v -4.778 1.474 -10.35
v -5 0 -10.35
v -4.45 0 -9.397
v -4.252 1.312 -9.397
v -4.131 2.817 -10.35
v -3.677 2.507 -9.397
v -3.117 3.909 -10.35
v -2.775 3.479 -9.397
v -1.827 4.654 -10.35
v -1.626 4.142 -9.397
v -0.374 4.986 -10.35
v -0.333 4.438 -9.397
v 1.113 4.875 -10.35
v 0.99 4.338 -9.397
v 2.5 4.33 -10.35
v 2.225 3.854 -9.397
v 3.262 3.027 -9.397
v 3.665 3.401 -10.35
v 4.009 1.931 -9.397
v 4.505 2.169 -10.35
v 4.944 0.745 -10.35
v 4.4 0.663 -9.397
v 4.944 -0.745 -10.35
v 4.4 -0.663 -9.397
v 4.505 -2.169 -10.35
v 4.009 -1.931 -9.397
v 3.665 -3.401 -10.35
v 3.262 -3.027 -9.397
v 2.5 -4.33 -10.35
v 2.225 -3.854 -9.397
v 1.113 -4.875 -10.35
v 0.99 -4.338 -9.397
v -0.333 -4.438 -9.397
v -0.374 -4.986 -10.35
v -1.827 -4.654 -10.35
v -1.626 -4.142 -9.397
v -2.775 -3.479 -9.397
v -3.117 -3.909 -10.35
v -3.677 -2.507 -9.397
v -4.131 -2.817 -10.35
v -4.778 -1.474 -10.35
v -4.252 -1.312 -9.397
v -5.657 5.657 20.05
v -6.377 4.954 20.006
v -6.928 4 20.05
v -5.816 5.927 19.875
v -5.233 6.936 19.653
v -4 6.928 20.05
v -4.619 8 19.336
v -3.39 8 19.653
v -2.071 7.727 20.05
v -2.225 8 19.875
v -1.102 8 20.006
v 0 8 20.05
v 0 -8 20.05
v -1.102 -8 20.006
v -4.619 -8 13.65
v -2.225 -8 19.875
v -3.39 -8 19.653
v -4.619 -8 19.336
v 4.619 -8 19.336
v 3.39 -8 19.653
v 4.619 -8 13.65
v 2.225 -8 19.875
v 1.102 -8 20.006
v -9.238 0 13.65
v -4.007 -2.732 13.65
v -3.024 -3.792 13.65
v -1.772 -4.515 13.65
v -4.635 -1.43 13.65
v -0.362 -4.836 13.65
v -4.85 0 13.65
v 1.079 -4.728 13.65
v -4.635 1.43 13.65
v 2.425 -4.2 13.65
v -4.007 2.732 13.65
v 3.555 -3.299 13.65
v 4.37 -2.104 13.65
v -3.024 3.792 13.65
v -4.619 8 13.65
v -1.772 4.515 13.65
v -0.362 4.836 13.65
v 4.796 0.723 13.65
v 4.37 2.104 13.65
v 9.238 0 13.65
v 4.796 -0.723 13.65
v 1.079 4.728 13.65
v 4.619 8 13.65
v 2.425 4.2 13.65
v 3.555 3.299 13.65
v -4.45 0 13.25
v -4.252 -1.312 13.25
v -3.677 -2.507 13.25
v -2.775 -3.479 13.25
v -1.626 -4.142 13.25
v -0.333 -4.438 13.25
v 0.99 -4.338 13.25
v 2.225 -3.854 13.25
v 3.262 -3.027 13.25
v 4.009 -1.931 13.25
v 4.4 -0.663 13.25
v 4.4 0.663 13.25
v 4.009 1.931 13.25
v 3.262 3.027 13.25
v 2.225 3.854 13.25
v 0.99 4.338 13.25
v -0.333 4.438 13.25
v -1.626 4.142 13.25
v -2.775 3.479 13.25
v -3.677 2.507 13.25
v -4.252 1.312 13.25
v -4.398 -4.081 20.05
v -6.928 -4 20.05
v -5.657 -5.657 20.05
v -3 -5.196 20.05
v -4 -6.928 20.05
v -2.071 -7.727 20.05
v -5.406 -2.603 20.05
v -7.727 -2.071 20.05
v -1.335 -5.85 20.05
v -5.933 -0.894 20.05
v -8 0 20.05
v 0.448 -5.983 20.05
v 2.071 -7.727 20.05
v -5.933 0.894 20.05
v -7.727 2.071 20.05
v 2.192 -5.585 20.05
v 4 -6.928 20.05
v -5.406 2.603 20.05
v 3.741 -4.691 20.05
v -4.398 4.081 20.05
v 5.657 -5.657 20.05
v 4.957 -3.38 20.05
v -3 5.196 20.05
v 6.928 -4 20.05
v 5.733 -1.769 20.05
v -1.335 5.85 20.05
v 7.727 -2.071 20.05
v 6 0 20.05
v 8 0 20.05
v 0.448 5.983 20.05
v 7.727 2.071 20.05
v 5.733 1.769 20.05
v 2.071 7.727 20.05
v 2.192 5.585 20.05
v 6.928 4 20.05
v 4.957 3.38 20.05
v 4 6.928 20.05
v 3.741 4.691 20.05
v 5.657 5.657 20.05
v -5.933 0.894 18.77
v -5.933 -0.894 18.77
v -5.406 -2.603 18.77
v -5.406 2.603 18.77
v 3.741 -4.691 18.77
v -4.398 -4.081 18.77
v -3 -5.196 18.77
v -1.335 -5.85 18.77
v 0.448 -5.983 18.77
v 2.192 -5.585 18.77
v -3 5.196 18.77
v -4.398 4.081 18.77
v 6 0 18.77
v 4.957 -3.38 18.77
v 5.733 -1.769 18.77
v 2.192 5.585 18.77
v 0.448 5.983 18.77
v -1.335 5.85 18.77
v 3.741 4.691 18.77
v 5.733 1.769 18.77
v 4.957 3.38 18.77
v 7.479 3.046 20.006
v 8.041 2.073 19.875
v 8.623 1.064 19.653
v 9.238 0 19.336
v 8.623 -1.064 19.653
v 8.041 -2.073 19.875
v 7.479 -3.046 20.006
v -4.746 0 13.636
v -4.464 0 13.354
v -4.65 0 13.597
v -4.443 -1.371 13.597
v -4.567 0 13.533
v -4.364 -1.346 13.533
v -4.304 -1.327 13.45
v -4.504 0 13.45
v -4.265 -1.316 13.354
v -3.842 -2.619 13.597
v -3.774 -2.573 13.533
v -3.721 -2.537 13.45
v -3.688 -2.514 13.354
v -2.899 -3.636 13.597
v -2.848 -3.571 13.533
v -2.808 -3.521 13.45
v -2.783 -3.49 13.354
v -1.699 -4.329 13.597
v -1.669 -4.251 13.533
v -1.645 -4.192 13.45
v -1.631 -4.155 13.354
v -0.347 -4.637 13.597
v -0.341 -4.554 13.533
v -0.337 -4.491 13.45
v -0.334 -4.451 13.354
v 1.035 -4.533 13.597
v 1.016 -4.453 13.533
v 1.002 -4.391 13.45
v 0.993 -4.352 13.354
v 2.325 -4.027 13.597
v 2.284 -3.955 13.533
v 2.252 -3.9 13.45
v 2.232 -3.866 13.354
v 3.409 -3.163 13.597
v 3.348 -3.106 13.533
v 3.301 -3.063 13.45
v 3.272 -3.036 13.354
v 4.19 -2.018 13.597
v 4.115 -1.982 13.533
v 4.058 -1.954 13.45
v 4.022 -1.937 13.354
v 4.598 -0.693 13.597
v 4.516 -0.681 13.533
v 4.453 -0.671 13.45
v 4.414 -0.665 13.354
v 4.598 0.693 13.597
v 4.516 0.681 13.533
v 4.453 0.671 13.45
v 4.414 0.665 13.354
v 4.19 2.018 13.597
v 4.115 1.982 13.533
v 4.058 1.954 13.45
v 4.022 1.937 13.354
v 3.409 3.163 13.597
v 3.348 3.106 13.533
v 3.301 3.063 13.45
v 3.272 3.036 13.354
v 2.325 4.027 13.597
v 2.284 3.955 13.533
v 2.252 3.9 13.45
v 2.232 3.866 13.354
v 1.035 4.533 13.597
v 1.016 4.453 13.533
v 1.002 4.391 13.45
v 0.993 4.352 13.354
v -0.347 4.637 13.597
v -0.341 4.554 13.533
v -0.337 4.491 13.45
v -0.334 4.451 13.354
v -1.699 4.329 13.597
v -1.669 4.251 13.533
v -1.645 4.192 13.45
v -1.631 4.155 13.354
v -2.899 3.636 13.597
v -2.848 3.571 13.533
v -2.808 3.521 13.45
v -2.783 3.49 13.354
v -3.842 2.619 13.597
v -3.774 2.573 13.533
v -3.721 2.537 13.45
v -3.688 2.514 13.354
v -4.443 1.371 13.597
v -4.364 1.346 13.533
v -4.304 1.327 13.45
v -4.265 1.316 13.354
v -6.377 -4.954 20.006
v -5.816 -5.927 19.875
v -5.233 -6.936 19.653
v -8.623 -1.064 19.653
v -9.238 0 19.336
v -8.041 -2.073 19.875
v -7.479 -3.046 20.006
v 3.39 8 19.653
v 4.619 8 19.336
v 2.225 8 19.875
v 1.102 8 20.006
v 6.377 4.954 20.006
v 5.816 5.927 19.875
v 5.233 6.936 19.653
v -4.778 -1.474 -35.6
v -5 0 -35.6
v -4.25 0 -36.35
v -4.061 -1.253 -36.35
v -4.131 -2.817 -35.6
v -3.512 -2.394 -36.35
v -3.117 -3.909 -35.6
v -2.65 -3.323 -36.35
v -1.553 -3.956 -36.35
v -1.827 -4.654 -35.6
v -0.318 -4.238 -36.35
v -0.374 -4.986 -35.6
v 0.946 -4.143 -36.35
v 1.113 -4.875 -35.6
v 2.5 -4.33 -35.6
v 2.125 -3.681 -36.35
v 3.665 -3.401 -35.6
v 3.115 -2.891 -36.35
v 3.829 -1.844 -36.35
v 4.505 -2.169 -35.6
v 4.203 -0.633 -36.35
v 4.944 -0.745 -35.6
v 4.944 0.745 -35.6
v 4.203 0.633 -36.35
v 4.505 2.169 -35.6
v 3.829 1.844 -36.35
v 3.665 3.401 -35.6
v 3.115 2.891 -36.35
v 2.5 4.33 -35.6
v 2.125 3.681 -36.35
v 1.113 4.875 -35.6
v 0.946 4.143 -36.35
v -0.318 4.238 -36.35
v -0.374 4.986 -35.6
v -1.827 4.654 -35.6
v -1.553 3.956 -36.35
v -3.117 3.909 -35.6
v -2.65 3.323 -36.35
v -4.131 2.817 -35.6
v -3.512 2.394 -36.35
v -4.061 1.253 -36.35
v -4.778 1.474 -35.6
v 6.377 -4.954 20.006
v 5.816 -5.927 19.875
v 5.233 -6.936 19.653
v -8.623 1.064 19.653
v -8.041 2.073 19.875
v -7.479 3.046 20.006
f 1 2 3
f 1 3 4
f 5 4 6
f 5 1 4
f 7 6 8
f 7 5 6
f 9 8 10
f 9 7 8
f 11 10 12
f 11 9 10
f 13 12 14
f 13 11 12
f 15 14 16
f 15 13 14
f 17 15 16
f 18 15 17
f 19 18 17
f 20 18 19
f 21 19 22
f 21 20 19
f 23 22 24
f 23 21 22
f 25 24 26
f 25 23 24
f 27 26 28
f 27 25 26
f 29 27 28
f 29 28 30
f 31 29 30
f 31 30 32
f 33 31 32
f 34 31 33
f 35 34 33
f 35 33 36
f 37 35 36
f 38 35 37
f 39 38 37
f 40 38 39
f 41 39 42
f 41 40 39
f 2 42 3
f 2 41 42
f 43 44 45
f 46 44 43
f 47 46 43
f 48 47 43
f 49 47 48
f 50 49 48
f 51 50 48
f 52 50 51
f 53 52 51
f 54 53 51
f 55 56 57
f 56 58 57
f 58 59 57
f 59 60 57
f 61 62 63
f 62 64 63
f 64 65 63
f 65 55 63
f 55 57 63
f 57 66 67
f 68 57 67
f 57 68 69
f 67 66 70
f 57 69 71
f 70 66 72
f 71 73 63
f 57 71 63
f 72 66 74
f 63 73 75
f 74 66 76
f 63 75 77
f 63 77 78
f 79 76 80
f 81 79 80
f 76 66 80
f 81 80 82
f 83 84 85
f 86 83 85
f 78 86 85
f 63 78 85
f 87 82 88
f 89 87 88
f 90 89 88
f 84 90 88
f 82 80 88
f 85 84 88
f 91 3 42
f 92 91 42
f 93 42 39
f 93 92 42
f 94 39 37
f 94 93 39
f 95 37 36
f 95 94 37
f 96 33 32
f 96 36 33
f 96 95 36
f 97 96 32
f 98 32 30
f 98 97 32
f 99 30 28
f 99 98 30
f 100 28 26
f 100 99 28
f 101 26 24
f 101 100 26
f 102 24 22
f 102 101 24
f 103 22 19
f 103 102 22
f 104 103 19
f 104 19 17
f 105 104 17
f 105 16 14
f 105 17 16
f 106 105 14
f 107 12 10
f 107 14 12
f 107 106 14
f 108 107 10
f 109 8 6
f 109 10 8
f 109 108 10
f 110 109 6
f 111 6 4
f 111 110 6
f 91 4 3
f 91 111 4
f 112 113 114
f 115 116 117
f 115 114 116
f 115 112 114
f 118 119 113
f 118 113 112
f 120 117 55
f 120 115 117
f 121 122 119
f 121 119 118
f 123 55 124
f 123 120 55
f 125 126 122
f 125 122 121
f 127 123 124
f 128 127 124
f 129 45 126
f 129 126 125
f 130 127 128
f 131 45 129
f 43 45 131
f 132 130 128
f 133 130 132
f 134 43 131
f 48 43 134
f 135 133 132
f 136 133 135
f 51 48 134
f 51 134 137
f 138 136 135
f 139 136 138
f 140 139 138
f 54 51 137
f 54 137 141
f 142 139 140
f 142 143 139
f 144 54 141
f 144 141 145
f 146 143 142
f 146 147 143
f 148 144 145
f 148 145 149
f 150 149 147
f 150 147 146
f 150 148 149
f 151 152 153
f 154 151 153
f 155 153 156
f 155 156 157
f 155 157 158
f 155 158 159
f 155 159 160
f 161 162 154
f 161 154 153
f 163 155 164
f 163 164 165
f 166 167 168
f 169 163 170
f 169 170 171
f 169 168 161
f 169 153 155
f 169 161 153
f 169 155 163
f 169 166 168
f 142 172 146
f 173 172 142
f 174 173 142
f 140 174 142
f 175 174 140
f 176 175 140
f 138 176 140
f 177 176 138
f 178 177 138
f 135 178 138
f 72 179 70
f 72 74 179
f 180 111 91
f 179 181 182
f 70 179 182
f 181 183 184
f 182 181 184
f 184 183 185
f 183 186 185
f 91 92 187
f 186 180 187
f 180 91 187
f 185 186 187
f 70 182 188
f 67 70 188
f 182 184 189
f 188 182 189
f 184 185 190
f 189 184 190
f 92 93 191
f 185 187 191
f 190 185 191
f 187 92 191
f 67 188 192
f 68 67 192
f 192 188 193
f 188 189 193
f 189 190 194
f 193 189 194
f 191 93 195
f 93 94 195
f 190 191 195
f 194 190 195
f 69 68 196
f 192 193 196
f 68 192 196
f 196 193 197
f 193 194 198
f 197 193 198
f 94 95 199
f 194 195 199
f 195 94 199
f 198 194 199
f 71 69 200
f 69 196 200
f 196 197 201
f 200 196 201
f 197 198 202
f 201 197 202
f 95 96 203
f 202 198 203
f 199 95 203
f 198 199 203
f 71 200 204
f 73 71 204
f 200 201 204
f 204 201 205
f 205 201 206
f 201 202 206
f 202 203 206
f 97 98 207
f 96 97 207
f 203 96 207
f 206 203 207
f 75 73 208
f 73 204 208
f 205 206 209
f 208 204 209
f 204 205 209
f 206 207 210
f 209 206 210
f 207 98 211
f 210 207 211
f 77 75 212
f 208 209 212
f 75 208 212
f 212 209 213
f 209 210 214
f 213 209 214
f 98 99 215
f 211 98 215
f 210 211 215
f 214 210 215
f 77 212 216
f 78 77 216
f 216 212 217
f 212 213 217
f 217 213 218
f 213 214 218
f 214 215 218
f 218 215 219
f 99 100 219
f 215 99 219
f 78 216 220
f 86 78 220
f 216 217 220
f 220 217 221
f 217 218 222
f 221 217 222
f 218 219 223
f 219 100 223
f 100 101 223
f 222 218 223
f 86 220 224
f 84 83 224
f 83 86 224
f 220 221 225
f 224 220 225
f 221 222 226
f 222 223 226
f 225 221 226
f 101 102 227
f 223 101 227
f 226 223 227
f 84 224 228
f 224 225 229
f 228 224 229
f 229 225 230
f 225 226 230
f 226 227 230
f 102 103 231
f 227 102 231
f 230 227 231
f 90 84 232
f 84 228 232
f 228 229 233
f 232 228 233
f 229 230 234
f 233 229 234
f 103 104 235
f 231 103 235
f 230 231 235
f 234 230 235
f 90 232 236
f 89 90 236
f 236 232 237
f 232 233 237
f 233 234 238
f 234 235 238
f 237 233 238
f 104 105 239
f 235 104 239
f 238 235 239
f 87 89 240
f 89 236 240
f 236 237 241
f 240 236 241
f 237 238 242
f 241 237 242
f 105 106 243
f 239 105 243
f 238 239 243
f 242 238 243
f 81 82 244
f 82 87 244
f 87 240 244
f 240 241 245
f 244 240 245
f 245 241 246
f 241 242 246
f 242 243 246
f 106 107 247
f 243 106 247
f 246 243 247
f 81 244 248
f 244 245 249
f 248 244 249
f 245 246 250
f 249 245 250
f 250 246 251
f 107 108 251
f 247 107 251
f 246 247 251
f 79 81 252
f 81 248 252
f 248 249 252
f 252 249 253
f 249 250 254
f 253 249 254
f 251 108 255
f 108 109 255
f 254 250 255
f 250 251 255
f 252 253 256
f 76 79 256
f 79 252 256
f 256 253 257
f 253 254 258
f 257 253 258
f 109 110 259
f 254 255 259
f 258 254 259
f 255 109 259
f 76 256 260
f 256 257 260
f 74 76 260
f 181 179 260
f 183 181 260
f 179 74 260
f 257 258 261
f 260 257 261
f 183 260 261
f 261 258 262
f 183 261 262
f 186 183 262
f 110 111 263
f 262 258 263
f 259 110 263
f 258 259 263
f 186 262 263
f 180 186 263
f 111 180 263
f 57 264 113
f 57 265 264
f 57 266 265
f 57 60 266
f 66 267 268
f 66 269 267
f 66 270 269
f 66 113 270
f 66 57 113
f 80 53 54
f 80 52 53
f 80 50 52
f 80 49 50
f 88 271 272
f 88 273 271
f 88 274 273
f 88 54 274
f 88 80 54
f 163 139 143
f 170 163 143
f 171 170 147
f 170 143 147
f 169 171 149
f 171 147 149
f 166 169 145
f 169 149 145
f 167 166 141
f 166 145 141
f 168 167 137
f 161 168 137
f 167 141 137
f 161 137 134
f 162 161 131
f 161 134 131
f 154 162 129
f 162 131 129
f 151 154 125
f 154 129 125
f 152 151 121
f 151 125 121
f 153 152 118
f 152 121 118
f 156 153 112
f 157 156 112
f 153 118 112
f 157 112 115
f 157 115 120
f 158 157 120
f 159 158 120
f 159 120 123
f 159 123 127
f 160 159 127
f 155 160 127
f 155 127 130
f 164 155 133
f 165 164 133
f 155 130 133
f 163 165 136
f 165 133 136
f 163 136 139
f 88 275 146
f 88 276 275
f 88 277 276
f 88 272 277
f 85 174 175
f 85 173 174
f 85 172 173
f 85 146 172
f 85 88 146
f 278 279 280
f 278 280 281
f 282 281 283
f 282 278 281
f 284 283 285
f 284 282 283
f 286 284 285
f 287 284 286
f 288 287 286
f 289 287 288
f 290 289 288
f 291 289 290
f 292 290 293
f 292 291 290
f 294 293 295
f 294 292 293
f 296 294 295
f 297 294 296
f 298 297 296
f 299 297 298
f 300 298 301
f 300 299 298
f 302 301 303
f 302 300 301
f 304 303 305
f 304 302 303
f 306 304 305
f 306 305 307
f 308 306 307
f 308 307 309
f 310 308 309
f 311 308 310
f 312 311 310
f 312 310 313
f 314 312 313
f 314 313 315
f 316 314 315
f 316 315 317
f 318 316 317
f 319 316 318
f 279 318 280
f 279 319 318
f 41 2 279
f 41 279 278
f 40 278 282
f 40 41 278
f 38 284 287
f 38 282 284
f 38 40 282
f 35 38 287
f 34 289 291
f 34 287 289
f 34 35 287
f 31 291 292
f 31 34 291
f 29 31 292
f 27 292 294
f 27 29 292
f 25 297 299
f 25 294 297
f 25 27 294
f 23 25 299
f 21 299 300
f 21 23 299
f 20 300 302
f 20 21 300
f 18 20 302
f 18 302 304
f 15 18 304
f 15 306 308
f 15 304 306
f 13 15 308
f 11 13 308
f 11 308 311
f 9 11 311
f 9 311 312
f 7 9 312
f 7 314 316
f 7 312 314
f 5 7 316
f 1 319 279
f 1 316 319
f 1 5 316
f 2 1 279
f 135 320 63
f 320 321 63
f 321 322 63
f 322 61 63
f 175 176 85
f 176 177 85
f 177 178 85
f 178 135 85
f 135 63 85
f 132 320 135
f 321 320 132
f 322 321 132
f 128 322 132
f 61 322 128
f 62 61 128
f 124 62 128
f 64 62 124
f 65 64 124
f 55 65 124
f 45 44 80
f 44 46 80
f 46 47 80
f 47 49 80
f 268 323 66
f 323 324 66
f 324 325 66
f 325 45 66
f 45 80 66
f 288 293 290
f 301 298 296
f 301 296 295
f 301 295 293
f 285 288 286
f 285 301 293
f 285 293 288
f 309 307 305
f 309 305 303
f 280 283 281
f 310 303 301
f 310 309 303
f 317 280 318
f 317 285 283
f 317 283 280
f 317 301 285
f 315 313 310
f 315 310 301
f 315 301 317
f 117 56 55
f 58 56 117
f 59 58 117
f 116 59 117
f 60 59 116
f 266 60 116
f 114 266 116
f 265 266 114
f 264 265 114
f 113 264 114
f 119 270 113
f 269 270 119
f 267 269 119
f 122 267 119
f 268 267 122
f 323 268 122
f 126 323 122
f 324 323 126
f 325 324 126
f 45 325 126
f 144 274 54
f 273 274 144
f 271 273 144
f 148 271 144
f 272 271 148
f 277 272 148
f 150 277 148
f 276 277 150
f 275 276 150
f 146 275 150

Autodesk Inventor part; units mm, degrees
ref_plane "YZ Plane" through (0, 0, 0) normal (1, 0, 0) x (0, 1, 0)
sketch "Sketch2" plane through (0, 0, 0) normal (0, 1, 0) x (-1, 0, 0)
  line L0 (0, 13.6501) -> (0, -36.3499)
  line L1 (0, -36.3499) -> (4.25, -36.3499)
  line L2 (5, -35.5999) -> (5, -10.3499)
  line L3 (5, -10.3499) -> (4.45, -9.3972)
  line L4 (4.45, -9.3972) -> (4.45, 13.6501)
  line L5 (4.45, 13.6501) -> (0, 13.6501)
  line L6 (4.25, -36.3499) -> (5, -35.5999)
  line L7 (5, -36.3499) -> (5, -37.4105)
  line L8 (0, -47.6227) -> (0, 23.8623) projected
  dimension "Ds" = 8.9
  dimension "NND" = 10
  dimension "b" = 26
  dimension "d3" = 30
  dimension "d5" = 45
  dimension "PTC" = 1.5
  dimension "NLG" = 50
revolve "Revolution1" add sketch "Sketch2" angle 360 about axis through (0, 0, 13.6501) along (0, 0, -1)
sketch "Sketch3" plane through (0, 0, 13.6501) normal (0, 0, 1) x (1, 0, 0)
  circle A0 centre (0, 0) radius 4.45 projected
  line L0 (0, 8) -> (4.6188, 8)
  line L1 (4.6188, 8) -> (9.2376, 0)
  line L2 (9.2376, 0) -> (0, 0)
  line L3 (0, 0) -> (0, 8)
  line L4 (0, 8) -> (-4.6188, 8)
  line L5 (-4.6188, 8) -> (-9.2376, 0)
  line L6 (0, -8) -> (4.6188, -8)
  line L7 (4.6188, -8) -> (9.2376, 0)
  line L8 (-4.6188, -8) -> (-9.2376, 0)
  line L9 (0, -8) -> (-4.6188, -8)
  dimension "d9" = 60
  dimension "ParS" = 16
  dimension "msp_d11" = 16
extrude "Extrusion1" add sketch "Sketch3" along normal blind 6.4
sketch "Sketch4" plane through (0, 0, 0) normal (0, 1, 0) x (-1, 0, 0)
  line L0 (-8, 20.0501) -> (-9.2376, 20.0501)
  line L1 (-9.2376, 20.0501) -> (-9.2376, 19.3356)
  line L2 (-9.2376, 19.3356) -> (-8, 20.0501)
  line L3 (0, 10.8015) -> (0, 30.7419) projected
  line L4 (0, 27.8933) -> (0, 27.1787)
  line L5 (-9.2376, 13.6501) -> (-9.2376, 20.0501) projected
  line L6 (-4.6188, 20.0501) -> (-9.2376, 20.0501) projected
  dimension "d14" = 30
  dimension "msp_d15" = 16
revolve "Revolution2" cut sketch "Sketch4" angle 360 about axis through (0, 0, 27.8933) along (0, 0, -1)
sketch "Sketch5" plane through (0, 0, 20.0501) normal (0, 0, 1) x (1, 0, 0)
  arc A0 (6.9282, 4) -> (0, 8) centre (0, 0) ccw projected
  circle A1 centre (0, 0) radius 6
  dimension "d27" = 12
extrude "Extrusion2" cut sketch "Sketch5" against normal blind 1.28
thread "Thread1" size "M10x1.5" class "6g" standard "ISO Metric profile" full length
ref_plane "MSC_PF1" through (0, 0, 0) normal (0, 1, 0) x (-1, 0, 0)
ref_plane "MSC_PT1" through (0, 0, 13.6501) normal (0, 0, -1) x (-1, 0, 0)
fillet "Fillet1" radius 0.4 1 edges at (4.45, 0, 13.6501)
equation "\"msp_d11\" = ParS"
equation "\"msp_d15\" = ParS"
equation "\"d27\" = 0.75 * ParS"
equation "\"d28\" = 0.2 * ParK"
equation "\"d30\" = r"
equation "\"msp_d17\" = b"
equation "\"r\" = 0.4"
equation "\"ParK\" = 6.4"
properties part number "CSN EN 24015 - M10x50" material "Steel, Mild"
